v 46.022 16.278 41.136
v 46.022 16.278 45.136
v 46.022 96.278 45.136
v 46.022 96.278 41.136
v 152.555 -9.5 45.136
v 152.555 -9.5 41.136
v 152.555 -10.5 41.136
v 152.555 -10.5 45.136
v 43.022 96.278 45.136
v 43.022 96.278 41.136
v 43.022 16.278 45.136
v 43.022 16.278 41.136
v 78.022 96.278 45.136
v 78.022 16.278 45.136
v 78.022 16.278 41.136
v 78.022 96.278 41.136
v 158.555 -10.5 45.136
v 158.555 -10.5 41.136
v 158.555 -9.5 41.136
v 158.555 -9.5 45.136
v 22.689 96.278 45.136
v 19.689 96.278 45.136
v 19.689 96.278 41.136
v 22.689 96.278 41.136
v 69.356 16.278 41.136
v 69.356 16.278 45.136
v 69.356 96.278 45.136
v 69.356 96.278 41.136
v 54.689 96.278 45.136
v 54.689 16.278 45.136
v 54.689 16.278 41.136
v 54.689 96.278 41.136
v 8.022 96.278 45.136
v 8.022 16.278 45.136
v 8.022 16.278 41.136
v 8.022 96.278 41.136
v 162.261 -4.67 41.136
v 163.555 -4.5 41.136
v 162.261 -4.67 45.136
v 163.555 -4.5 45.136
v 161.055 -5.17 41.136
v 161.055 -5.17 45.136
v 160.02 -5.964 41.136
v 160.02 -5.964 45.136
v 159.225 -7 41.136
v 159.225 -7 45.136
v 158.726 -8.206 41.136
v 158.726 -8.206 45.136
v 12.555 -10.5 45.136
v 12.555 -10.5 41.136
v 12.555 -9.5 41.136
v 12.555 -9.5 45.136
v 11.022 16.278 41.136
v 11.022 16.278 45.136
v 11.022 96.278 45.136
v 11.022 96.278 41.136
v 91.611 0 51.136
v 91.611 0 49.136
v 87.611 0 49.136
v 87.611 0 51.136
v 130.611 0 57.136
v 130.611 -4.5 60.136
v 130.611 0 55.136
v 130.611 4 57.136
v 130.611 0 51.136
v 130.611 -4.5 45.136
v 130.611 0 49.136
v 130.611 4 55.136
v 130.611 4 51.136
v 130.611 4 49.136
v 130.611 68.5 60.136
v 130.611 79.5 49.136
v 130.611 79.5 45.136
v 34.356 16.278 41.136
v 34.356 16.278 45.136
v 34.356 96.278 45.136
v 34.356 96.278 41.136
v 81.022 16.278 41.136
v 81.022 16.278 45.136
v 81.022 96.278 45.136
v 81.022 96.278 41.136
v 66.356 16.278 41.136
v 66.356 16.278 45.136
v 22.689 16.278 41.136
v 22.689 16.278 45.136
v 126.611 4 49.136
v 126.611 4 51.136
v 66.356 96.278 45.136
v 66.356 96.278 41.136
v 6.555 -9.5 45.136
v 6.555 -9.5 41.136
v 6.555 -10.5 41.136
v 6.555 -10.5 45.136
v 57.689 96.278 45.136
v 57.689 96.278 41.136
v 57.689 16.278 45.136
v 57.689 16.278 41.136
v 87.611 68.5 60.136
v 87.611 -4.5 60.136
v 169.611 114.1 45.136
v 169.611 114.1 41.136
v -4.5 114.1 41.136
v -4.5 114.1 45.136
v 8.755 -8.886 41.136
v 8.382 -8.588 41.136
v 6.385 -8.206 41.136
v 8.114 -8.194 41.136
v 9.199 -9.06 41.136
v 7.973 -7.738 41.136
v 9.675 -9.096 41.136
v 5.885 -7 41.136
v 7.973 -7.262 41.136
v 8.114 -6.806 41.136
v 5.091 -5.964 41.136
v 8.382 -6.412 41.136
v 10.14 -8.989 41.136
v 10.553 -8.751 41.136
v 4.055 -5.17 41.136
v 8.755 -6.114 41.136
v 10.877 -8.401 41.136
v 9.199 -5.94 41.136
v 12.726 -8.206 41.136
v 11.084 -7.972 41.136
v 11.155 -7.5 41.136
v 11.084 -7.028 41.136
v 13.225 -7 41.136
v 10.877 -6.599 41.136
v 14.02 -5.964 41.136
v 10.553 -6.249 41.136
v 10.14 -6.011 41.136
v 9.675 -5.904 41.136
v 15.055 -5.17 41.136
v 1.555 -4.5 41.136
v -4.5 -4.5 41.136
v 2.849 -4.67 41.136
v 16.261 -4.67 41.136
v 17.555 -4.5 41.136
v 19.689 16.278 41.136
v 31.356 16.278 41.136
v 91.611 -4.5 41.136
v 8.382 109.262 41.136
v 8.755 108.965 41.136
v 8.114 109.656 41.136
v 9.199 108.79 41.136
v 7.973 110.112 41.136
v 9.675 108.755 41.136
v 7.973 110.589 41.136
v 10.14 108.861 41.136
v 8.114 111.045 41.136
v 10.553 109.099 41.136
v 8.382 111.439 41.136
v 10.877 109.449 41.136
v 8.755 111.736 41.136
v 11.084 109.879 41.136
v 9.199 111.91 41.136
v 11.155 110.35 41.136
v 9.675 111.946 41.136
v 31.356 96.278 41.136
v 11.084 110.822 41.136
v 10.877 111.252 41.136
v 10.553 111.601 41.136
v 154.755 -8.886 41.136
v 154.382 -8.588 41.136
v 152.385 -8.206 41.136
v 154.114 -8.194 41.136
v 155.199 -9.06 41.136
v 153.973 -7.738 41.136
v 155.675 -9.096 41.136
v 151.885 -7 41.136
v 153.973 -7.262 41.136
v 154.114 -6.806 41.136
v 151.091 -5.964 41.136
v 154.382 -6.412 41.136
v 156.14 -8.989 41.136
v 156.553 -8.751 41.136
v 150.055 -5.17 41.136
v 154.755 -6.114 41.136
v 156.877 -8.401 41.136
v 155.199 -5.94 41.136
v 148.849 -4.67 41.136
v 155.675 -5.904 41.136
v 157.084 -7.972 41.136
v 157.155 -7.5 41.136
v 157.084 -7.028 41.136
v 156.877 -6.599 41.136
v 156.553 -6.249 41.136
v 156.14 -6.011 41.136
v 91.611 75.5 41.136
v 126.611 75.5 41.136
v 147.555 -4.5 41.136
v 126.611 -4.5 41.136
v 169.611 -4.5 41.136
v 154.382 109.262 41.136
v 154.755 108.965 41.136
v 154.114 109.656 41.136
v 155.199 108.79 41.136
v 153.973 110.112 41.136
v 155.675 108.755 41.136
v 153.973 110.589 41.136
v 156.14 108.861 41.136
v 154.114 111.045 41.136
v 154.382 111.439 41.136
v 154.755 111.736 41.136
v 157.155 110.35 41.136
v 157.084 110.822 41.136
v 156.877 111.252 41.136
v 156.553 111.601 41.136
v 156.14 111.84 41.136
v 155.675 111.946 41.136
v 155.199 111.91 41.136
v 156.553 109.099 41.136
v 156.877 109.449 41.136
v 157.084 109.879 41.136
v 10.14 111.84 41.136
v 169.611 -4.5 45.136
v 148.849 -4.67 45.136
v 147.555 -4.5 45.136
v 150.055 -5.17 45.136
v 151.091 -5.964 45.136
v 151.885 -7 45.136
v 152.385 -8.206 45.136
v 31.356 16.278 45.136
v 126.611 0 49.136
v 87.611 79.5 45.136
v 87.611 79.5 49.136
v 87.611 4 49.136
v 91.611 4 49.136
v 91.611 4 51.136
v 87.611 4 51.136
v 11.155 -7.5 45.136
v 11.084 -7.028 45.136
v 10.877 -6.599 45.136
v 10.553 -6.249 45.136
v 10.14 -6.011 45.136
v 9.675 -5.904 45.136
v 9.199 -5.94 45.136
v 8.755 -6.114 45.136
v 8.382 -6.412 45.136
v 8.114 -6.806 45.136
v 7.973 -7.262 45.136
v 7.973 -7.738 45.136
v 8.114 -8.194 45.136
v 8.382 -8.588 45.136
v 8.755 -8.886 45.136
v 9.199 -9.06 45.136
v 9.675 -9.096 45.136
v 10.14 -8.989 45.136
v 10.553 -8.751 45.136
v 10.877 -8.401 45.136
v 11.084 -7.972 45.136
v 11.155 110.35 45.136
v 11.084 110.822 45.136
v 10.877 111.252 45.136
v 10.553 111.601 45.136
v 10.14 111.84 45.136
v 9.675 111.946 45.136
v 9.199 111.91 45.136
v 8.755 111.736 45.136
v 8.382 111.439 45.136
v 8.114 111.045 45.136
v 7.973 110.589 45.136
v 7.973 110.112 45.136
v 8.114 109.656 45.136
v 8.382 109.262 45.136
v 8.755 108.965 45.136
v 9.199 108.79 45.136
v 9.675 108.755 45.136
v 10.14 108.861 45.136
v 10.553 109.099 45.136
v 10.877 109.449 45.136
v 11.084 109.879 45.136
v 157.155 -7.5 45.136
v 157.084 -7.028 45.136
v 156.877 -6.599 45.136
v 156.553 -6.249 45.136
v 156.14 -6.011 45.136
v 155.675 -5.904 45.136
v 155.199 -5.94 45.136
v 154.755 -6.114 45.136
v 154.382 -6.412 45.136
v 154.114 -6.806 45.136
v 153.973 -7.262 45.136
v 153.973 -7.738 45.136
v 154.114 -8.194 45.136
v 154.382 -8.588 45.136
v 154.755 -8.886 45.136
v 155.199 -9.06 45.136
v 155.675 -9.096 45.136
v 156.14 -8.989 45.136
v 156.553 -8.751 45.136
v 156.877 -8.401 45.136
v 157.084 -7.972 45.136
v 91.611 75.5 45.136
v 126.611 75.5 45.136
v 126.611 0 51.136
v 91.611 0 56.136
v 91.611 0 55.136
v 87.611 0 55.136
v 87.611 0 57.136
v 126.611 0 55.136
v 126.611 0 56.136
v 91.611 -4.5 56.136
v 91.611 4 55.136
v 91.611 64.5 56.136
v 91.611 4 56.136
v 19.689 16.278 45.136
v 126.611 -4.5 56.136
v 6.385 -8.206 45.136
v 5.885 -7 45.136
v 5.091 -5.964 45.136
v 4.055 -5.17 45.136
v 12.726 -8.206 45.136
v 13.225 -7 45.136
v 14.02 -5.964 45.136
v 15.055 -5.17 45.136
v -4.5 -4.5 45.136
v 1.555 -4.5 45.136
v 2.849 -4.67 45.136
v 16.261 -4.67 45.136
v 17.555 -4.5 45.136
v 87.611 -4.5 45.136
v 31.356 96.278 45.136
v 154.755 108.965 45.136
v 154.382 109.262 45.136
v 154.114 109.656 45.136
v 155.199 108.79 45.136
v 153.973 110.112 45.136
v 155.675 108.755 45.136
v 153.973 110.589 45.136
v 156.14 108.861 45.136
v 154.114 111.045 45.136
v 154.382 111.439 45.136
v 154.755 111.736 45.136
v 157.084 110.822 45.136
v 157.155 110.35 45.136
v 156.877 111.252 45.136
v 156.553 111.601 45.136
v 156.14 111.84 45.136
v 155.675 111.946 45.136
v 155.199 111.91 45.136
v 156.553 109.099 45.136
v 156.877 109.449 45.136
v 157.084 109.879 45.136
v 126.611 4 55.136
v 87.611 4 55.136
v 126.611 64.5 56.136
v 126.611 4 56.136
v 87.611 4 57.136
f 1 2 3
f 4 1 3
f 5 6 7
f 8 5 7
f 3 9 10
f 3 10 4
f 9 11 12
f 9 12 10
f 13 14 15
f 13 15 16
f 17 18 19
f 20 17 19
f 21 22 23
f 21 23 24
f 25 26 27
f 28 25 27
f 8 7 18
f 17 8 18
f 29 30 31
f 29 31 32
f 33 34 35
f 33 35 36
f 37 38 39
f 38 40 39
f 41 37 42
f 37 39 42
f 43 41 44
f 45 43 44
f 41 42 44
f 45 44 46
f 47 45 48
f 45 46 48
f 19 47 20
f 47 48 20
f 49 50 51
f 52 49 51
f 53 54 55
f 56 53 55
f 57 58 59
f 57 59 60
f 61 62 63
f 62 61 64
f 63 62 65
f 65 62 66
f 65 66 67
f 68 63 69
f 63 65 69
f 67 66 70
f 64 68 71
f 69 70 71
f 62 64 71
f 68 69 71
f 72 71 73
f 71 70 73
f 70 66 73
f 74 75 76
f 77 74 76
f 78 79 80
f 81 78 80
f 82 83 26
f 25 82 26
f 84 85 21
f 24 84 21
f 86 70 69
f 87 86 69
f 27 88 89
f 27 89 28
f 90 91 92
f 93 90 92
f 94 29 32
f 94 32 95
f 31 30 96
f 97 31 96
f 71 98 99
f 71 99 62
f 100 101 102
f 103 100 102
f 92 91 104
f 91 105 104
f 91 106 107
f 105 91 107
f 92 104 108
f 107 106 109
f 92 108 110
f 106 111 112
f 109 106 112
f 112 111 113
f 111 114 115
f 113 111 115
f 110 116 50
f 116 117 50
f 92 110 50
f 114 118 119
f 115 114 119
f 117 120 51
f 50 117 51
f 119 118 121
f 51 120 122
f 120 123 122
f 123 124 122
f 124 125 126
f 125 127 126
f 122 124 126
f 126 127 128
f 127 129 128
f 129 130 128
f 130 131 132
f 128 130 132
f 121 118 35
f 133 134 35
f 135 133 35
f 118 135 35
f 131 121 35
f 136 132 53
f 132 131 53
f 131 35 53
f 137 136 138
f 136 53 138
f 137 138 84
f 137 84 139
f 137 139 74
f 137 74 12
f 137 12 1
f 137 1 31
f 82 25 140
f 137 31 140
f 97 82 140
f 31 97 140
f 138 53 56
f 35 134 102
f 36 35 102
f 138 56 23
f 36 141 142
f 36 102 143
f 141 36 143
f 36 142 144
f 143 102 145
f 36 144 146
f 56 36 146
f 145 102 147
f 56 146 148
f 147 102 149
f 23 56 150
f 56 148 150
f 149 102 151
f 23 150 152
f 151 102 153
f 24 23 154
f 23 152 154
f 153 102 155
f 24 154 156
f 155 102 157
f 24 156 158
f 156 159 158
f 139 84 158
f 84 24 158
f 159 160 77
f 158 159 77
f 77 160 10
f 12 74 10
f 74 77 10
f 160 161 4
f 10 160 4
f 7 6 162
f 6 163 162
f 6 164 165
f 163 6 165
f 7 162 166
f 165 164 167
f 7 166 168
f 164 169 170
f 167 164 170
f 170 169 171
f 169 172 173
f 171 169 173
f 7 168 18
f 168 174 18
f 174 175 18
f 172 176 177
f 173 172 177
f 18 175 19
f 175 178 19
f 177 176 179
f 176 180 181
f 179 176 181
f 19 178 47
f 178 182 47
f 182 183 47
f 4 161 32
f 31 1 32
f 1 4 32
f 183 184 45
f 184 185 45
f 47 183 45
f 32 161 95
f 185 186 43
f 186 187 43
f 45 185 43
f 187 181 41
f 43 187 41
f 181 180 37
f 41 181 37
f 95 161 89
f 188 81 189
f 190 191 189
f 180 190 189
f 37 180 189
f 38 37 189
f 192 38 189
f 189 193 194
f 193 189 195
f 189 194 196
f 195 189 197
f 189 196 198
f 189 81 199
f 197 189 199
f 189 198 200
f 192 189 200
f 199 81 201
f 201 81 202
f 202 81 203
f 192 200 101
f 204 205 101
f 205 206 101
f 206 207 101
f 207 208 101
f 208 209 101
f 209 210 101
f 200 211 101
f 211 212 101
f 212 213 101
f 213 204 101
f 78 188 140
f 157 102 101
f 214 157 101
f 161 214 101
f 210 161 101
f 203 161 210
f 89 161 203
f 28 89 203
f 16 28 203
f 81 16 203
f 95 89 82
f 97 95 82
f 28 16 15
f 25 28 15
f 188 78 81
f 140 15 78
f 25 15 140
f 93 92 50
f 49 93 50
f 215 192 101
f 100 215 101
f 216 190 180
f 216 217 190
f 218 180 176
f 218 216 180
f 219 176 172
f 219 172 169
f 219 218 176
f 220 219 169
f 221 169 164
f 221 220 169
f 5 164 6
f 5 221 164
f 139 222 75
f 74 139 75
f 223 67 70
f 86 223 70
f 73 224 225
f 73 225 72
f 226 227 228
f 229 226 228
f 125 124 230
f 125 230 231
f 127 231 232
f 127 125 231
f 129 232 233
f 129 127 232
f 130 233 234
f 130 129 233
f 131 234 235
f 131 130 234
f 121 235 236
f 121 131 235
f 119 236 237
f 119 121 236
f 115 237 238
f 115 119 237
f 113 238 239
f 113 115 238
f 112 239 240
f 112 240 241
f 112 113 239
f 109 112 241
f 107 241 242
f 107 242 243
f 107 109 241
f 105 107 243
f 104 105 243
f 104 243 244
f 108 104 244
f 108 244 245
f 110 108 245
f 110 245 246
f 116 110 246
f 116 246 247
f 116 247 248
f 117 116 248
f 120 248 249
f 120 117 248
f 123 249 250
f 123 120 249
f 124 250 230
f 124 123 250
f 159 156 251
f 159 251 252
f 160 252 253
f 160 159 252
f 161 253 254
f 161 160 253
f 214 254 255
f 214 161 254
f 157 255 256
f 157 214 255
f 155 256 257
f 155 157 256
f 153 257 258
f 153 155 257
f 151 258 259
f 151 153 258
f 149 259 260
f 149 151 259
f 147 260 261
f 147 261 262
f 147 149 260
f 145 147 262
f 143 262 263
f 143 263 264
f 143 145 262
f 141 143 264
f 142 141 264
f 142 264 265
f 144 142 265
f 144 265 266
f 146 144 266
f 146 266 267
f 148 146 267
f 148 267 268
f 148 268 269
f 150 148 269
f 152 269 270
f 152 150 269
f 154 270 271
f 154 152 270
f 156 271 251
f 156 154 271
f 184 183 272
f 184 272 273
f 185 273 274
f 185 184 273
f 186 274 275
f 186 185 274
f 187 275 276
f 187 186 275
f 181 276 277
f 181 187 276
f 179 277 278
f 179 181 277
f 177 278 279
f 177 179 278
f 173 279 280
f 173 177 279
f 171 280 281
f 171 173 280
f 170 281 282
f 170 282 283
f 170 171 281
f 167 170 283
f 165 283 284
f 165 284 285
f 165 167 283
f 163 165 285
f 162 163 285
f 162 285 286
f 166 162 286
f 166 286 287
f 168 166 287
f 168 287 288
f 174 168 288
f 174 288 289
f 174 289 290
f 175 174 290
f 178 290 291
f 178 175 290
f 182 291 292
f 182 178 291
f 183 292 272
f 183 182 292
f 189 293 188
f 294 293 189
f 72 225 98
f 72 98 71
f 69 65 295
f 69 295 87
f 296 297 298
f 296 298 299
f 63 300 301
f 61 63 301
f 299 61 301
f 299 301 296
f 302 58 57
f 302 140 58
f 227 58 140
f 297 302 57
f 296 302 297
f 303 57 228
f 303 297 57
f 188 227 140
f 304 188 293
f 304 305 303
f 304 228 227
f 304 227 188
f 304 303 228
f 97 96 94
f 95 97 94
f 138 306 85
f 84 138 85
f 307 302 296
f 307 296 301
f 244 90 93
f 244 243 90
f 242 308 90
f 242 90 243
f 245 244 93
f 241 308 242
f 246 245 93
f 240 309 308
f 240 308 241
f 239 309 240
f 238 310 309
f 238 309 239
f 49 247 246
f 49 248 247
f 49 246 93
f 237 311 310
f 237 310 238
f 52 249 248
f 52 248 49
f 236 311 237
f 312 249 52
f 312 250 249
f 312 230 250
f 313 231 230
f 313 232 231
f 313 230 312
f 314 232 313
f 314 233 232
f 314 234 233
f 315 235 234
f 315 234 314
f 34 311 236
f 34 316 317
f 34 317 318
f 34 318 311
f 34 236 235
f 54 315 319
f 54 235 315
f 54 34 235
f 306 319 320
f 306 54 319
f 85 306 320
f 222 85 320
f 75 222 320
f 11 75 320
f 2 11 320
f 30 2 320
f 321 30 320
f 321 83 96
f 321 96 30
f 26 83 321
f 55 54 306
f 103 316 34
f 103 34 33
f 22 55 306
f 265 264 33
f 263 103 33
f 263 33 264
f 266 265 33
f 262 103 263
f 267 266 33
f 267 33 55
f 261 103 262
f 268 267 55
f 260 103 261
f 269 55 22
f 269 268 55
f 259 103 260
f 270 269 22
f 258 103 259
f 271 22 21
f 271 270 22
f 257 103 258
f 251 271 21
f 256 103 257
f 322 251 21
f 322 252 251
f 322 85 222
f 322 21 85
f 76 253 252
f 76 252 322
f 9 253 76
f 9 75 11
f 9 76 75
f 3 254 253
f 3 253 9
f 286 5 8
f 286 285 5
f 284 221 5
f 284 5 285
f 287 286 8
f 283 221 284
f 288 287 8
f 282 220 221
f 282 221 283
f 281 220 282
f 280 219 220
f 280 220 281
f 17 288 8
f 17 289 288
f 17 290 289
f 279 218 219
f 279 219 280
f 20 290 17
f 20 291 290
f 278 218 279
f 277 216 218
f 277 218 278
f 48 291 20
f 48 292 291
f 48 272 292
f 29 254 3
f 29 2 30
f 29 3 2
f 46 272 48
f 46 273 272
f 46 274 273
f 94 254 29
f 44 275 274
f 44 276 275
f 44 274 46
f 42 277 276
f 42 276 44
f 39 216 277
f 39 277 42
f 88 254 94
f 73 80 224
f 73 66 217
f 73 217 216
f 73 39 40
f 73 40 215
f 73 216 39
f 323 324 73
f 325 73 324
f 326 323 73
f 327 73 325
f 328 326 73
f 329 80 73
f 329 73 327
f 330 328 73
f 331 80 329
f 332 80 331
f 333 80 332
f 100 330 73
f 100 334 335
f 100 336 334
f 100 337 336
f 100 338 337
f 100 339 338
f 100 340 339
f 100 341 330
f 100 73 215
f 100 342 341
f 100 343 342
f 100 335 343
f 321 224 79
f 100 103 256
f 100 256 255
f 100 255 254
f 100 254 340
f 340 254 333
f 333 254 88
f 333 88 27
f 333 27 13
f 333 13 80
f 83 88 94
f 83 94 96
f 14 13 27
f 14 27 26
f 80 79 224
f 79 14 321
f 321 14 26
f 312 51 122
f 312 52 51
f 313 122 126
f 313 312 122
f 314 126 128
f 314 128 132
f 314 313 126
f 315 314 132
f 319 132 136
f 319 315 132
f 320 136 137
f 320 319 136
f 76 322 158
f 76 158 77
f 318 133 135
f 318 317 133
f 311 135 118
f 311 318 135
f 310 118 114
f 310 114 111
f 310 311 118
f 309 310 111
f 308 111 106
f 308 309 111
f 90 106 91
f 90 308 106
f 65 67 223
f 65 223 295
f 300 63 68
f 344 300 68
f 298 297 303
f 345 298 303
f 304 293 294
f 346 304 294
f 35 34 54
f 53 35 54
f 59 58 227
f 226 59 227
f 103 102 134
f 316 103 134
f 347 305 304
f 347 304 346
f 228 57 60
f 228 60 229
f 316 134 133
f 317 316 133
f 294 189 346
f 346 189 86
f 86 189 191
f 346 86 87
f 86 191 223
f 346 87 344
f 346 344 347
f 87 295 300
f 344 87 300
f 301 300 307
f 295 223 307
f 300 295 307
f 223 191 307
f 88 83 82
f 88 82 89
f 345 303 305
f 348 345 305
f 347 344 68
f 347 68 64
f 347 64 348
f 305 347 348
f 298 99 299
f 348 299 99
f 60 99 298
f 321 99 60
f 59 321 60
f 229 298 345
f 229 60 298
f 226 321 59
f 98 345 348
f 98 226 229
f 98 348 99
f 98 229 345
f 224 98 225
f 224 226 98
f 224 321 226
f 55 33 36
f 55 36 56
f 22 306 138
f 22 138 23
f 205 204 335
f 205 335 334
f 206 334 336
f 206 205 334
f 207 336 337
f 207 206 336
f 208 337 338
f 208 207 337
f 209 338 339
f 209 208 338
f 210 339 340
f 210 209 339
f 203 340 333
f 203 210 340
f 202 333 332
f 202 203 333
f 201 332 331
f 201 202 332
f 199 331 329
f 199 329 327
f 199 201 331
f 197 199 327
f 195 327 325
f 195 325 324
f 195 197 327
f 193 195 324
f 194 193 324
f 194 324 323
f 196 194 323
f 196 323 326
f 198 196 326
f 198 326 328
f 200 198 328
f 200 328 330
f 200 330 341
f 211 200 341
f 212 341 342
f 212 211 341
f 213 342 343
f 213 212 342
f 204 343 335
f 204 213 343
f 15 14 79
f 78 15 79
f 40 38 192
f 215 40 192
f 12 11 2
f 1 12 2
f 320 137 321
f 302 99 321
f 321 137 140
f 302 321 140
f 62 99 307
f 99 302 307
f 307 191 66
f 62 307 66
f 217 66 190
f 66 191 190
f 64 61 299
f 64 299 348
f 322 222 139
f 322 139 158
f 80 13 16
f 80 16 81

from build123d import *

# Parameters (mm, degrees)
SKETCH016_R            = 1.6
PAD005_DEPTH           = 4
FILLET_R               = 5
SKETCH017_W            = 35
SKETCH017_H            = 80
POCKET011_DEPTH        = 5
SKETCH018_W            = 43
SKETCH018_H            = 84
PAD006_DEPTH           = 15
SKETCH019_W            = 35
SKETCH019_H            = 15
POCKET012_DEPTH        = 80
CHAMFER002_SIZE        = 11
CHAMFER003_SIZE        = 11
SKETCH020_W            = 4
SKETCH020_H            = 2
POCKET013_DEPTH        = 135.111544
SKETCH021_W            = 3
SKETCH021_H            = 80
POCKET014_DEPTH        = 4.001
LINEARPATTERN002_COUNT = 7
LINEARPATTERN002_PITCH = 11.666667


with BuildPart() as part:
    # Sketch016 (on Face1 of ShapeBinder001) → Pad005 (new body)
    with BuildSketch(Plane.XY.offset(41.135521)):
        Polygon((-4.5, 114.100381), (-4.5, -4.5), (6.555272, -4.5), (6.555272, -10.5), (12.555272, -10.5), (12.555272, -4.5), (152.555272, -4.5), (152.555272, -10.5), (158.555272, -10.5), (158.555272, -4.5), (169.610544, -4.5), (169.610544, 114.100381), align=None)
        with Locations((9.555272, 110.350381)):
            Circle(SKETCH016_R, mode=Mode.SUBTRACT)
        with Locations((155.555272, 110.350381)):
            Circle(SKETCH016_R, mode=Mode.SUBTRACT)
        with Locations((9.555272, -7.5)):
            Circle(SKETCH016_R, mode=Mode.SUBTRACT)
        with Locations((155.555272, -7.5)):
            Circle(SKETCH016_R, mode=Mode.SUBTRACT)
    extrude(amount=PAD005_DEPTH)

    # Fillet
    fillet_edges = [part.edges().sort_by_distance(p)[0] for p in [
        (158.555272, -4.5, 43.135521),
        (152.555272, -4.5, 43.135521),
        (6.555272, -4.5, 43.135521),
        (12.555272, -4.5, 43.135521),
    ]]
    fillet(fillet_edges, radius=FILLET_R)

    # Sketch017 (on Face5 of Fillet) → Pocket011 (cut)
    with BuildSketch(Plane.XY.offset(45.135521)):
        with Locations((109.110544, 35.5)):
            Rectangle(SKETCH017_W, SKETCH017_H)
    extrude(amount=-POCKET011_DEPTH, mode=Mode.SUBTRACT)

    # Sketch018 (on Face5 of Pocket011) → Pad006 (join)
    with BuildSketch(Plane.XY.offset(45.135521)):
        with Locations((109.110544, 37.5)):
            Rectangle(SKETCH018_W, SKETCH018_H)
    extrude(amount=PAD006_DEPTH)

    # Sketch019 (on Face30 of Pad006) → Pocket012 (cut)
    with BuildSketch(Plane.XZ.offset(4.5)):
        with Locations((109.110544, 48.635521)):
            Rectangle(SKETCH019_W, SKETCH019_H)
    extrude(amount=-POCKET012_DEPTH, mode=Mode.SUBTRACT)

    # Chamfer002
    chamfer002_edges = [part.edges().sort_by_distance(p)[0] for p in [
        (109.110544, 75.5, 56.135521),
    ]]
    chamfer(chamfer002_edges, length=CHAMFER002_SIZE)

    # Chamfer003
    chamfer003_edges = [part.edges().sort_by_distance(p)[0] for p in [
        (109.110544, 79.5, 60.135521),
    ]]
    chamfer(chamfer003_edges, length=CHAMFER003_SIZE)

    # Sketch020 (on Face7 of Chamfer003) → Pocket013 (cut, through all)
    with BuildSketch(Plane.YZ.offset(130.610544)):
        with Locations((2, 56.135521)):
            Rectangle(SKETCH020_W, SKETCH020_H)
        with Locations((2, 50.135521)):
            Rectangle(SKETCH020_W, SKETCH020_H)
    extrude(amount=-POCKET013_DEPTH, mode=Mode.SUBTRACT)

    # Sketch021 (on Face4 of Pocket013) → Pocket014 (cut, through all)
    with BuildSketch(Plane.XY.offset(45.135521)):
        with Locations((9.522231, 56.277565)):
            Rectangle(SKETCH021_W, SKETCH021_H)
    pocket014 = extrude(amount=-POCKET014_DEPTH, mode=Mode.SUBTRACT)

    # LinearPattern002: Pocket014 ×7
    with Locations(*[(i * LINEARPATTERN002_PITCH, 0, 0) for i in range(1, LINEARPATTERN002_COUNT)]):
        add(pocket014, mode=Mode.SUBTRACT)


solid = part.part
